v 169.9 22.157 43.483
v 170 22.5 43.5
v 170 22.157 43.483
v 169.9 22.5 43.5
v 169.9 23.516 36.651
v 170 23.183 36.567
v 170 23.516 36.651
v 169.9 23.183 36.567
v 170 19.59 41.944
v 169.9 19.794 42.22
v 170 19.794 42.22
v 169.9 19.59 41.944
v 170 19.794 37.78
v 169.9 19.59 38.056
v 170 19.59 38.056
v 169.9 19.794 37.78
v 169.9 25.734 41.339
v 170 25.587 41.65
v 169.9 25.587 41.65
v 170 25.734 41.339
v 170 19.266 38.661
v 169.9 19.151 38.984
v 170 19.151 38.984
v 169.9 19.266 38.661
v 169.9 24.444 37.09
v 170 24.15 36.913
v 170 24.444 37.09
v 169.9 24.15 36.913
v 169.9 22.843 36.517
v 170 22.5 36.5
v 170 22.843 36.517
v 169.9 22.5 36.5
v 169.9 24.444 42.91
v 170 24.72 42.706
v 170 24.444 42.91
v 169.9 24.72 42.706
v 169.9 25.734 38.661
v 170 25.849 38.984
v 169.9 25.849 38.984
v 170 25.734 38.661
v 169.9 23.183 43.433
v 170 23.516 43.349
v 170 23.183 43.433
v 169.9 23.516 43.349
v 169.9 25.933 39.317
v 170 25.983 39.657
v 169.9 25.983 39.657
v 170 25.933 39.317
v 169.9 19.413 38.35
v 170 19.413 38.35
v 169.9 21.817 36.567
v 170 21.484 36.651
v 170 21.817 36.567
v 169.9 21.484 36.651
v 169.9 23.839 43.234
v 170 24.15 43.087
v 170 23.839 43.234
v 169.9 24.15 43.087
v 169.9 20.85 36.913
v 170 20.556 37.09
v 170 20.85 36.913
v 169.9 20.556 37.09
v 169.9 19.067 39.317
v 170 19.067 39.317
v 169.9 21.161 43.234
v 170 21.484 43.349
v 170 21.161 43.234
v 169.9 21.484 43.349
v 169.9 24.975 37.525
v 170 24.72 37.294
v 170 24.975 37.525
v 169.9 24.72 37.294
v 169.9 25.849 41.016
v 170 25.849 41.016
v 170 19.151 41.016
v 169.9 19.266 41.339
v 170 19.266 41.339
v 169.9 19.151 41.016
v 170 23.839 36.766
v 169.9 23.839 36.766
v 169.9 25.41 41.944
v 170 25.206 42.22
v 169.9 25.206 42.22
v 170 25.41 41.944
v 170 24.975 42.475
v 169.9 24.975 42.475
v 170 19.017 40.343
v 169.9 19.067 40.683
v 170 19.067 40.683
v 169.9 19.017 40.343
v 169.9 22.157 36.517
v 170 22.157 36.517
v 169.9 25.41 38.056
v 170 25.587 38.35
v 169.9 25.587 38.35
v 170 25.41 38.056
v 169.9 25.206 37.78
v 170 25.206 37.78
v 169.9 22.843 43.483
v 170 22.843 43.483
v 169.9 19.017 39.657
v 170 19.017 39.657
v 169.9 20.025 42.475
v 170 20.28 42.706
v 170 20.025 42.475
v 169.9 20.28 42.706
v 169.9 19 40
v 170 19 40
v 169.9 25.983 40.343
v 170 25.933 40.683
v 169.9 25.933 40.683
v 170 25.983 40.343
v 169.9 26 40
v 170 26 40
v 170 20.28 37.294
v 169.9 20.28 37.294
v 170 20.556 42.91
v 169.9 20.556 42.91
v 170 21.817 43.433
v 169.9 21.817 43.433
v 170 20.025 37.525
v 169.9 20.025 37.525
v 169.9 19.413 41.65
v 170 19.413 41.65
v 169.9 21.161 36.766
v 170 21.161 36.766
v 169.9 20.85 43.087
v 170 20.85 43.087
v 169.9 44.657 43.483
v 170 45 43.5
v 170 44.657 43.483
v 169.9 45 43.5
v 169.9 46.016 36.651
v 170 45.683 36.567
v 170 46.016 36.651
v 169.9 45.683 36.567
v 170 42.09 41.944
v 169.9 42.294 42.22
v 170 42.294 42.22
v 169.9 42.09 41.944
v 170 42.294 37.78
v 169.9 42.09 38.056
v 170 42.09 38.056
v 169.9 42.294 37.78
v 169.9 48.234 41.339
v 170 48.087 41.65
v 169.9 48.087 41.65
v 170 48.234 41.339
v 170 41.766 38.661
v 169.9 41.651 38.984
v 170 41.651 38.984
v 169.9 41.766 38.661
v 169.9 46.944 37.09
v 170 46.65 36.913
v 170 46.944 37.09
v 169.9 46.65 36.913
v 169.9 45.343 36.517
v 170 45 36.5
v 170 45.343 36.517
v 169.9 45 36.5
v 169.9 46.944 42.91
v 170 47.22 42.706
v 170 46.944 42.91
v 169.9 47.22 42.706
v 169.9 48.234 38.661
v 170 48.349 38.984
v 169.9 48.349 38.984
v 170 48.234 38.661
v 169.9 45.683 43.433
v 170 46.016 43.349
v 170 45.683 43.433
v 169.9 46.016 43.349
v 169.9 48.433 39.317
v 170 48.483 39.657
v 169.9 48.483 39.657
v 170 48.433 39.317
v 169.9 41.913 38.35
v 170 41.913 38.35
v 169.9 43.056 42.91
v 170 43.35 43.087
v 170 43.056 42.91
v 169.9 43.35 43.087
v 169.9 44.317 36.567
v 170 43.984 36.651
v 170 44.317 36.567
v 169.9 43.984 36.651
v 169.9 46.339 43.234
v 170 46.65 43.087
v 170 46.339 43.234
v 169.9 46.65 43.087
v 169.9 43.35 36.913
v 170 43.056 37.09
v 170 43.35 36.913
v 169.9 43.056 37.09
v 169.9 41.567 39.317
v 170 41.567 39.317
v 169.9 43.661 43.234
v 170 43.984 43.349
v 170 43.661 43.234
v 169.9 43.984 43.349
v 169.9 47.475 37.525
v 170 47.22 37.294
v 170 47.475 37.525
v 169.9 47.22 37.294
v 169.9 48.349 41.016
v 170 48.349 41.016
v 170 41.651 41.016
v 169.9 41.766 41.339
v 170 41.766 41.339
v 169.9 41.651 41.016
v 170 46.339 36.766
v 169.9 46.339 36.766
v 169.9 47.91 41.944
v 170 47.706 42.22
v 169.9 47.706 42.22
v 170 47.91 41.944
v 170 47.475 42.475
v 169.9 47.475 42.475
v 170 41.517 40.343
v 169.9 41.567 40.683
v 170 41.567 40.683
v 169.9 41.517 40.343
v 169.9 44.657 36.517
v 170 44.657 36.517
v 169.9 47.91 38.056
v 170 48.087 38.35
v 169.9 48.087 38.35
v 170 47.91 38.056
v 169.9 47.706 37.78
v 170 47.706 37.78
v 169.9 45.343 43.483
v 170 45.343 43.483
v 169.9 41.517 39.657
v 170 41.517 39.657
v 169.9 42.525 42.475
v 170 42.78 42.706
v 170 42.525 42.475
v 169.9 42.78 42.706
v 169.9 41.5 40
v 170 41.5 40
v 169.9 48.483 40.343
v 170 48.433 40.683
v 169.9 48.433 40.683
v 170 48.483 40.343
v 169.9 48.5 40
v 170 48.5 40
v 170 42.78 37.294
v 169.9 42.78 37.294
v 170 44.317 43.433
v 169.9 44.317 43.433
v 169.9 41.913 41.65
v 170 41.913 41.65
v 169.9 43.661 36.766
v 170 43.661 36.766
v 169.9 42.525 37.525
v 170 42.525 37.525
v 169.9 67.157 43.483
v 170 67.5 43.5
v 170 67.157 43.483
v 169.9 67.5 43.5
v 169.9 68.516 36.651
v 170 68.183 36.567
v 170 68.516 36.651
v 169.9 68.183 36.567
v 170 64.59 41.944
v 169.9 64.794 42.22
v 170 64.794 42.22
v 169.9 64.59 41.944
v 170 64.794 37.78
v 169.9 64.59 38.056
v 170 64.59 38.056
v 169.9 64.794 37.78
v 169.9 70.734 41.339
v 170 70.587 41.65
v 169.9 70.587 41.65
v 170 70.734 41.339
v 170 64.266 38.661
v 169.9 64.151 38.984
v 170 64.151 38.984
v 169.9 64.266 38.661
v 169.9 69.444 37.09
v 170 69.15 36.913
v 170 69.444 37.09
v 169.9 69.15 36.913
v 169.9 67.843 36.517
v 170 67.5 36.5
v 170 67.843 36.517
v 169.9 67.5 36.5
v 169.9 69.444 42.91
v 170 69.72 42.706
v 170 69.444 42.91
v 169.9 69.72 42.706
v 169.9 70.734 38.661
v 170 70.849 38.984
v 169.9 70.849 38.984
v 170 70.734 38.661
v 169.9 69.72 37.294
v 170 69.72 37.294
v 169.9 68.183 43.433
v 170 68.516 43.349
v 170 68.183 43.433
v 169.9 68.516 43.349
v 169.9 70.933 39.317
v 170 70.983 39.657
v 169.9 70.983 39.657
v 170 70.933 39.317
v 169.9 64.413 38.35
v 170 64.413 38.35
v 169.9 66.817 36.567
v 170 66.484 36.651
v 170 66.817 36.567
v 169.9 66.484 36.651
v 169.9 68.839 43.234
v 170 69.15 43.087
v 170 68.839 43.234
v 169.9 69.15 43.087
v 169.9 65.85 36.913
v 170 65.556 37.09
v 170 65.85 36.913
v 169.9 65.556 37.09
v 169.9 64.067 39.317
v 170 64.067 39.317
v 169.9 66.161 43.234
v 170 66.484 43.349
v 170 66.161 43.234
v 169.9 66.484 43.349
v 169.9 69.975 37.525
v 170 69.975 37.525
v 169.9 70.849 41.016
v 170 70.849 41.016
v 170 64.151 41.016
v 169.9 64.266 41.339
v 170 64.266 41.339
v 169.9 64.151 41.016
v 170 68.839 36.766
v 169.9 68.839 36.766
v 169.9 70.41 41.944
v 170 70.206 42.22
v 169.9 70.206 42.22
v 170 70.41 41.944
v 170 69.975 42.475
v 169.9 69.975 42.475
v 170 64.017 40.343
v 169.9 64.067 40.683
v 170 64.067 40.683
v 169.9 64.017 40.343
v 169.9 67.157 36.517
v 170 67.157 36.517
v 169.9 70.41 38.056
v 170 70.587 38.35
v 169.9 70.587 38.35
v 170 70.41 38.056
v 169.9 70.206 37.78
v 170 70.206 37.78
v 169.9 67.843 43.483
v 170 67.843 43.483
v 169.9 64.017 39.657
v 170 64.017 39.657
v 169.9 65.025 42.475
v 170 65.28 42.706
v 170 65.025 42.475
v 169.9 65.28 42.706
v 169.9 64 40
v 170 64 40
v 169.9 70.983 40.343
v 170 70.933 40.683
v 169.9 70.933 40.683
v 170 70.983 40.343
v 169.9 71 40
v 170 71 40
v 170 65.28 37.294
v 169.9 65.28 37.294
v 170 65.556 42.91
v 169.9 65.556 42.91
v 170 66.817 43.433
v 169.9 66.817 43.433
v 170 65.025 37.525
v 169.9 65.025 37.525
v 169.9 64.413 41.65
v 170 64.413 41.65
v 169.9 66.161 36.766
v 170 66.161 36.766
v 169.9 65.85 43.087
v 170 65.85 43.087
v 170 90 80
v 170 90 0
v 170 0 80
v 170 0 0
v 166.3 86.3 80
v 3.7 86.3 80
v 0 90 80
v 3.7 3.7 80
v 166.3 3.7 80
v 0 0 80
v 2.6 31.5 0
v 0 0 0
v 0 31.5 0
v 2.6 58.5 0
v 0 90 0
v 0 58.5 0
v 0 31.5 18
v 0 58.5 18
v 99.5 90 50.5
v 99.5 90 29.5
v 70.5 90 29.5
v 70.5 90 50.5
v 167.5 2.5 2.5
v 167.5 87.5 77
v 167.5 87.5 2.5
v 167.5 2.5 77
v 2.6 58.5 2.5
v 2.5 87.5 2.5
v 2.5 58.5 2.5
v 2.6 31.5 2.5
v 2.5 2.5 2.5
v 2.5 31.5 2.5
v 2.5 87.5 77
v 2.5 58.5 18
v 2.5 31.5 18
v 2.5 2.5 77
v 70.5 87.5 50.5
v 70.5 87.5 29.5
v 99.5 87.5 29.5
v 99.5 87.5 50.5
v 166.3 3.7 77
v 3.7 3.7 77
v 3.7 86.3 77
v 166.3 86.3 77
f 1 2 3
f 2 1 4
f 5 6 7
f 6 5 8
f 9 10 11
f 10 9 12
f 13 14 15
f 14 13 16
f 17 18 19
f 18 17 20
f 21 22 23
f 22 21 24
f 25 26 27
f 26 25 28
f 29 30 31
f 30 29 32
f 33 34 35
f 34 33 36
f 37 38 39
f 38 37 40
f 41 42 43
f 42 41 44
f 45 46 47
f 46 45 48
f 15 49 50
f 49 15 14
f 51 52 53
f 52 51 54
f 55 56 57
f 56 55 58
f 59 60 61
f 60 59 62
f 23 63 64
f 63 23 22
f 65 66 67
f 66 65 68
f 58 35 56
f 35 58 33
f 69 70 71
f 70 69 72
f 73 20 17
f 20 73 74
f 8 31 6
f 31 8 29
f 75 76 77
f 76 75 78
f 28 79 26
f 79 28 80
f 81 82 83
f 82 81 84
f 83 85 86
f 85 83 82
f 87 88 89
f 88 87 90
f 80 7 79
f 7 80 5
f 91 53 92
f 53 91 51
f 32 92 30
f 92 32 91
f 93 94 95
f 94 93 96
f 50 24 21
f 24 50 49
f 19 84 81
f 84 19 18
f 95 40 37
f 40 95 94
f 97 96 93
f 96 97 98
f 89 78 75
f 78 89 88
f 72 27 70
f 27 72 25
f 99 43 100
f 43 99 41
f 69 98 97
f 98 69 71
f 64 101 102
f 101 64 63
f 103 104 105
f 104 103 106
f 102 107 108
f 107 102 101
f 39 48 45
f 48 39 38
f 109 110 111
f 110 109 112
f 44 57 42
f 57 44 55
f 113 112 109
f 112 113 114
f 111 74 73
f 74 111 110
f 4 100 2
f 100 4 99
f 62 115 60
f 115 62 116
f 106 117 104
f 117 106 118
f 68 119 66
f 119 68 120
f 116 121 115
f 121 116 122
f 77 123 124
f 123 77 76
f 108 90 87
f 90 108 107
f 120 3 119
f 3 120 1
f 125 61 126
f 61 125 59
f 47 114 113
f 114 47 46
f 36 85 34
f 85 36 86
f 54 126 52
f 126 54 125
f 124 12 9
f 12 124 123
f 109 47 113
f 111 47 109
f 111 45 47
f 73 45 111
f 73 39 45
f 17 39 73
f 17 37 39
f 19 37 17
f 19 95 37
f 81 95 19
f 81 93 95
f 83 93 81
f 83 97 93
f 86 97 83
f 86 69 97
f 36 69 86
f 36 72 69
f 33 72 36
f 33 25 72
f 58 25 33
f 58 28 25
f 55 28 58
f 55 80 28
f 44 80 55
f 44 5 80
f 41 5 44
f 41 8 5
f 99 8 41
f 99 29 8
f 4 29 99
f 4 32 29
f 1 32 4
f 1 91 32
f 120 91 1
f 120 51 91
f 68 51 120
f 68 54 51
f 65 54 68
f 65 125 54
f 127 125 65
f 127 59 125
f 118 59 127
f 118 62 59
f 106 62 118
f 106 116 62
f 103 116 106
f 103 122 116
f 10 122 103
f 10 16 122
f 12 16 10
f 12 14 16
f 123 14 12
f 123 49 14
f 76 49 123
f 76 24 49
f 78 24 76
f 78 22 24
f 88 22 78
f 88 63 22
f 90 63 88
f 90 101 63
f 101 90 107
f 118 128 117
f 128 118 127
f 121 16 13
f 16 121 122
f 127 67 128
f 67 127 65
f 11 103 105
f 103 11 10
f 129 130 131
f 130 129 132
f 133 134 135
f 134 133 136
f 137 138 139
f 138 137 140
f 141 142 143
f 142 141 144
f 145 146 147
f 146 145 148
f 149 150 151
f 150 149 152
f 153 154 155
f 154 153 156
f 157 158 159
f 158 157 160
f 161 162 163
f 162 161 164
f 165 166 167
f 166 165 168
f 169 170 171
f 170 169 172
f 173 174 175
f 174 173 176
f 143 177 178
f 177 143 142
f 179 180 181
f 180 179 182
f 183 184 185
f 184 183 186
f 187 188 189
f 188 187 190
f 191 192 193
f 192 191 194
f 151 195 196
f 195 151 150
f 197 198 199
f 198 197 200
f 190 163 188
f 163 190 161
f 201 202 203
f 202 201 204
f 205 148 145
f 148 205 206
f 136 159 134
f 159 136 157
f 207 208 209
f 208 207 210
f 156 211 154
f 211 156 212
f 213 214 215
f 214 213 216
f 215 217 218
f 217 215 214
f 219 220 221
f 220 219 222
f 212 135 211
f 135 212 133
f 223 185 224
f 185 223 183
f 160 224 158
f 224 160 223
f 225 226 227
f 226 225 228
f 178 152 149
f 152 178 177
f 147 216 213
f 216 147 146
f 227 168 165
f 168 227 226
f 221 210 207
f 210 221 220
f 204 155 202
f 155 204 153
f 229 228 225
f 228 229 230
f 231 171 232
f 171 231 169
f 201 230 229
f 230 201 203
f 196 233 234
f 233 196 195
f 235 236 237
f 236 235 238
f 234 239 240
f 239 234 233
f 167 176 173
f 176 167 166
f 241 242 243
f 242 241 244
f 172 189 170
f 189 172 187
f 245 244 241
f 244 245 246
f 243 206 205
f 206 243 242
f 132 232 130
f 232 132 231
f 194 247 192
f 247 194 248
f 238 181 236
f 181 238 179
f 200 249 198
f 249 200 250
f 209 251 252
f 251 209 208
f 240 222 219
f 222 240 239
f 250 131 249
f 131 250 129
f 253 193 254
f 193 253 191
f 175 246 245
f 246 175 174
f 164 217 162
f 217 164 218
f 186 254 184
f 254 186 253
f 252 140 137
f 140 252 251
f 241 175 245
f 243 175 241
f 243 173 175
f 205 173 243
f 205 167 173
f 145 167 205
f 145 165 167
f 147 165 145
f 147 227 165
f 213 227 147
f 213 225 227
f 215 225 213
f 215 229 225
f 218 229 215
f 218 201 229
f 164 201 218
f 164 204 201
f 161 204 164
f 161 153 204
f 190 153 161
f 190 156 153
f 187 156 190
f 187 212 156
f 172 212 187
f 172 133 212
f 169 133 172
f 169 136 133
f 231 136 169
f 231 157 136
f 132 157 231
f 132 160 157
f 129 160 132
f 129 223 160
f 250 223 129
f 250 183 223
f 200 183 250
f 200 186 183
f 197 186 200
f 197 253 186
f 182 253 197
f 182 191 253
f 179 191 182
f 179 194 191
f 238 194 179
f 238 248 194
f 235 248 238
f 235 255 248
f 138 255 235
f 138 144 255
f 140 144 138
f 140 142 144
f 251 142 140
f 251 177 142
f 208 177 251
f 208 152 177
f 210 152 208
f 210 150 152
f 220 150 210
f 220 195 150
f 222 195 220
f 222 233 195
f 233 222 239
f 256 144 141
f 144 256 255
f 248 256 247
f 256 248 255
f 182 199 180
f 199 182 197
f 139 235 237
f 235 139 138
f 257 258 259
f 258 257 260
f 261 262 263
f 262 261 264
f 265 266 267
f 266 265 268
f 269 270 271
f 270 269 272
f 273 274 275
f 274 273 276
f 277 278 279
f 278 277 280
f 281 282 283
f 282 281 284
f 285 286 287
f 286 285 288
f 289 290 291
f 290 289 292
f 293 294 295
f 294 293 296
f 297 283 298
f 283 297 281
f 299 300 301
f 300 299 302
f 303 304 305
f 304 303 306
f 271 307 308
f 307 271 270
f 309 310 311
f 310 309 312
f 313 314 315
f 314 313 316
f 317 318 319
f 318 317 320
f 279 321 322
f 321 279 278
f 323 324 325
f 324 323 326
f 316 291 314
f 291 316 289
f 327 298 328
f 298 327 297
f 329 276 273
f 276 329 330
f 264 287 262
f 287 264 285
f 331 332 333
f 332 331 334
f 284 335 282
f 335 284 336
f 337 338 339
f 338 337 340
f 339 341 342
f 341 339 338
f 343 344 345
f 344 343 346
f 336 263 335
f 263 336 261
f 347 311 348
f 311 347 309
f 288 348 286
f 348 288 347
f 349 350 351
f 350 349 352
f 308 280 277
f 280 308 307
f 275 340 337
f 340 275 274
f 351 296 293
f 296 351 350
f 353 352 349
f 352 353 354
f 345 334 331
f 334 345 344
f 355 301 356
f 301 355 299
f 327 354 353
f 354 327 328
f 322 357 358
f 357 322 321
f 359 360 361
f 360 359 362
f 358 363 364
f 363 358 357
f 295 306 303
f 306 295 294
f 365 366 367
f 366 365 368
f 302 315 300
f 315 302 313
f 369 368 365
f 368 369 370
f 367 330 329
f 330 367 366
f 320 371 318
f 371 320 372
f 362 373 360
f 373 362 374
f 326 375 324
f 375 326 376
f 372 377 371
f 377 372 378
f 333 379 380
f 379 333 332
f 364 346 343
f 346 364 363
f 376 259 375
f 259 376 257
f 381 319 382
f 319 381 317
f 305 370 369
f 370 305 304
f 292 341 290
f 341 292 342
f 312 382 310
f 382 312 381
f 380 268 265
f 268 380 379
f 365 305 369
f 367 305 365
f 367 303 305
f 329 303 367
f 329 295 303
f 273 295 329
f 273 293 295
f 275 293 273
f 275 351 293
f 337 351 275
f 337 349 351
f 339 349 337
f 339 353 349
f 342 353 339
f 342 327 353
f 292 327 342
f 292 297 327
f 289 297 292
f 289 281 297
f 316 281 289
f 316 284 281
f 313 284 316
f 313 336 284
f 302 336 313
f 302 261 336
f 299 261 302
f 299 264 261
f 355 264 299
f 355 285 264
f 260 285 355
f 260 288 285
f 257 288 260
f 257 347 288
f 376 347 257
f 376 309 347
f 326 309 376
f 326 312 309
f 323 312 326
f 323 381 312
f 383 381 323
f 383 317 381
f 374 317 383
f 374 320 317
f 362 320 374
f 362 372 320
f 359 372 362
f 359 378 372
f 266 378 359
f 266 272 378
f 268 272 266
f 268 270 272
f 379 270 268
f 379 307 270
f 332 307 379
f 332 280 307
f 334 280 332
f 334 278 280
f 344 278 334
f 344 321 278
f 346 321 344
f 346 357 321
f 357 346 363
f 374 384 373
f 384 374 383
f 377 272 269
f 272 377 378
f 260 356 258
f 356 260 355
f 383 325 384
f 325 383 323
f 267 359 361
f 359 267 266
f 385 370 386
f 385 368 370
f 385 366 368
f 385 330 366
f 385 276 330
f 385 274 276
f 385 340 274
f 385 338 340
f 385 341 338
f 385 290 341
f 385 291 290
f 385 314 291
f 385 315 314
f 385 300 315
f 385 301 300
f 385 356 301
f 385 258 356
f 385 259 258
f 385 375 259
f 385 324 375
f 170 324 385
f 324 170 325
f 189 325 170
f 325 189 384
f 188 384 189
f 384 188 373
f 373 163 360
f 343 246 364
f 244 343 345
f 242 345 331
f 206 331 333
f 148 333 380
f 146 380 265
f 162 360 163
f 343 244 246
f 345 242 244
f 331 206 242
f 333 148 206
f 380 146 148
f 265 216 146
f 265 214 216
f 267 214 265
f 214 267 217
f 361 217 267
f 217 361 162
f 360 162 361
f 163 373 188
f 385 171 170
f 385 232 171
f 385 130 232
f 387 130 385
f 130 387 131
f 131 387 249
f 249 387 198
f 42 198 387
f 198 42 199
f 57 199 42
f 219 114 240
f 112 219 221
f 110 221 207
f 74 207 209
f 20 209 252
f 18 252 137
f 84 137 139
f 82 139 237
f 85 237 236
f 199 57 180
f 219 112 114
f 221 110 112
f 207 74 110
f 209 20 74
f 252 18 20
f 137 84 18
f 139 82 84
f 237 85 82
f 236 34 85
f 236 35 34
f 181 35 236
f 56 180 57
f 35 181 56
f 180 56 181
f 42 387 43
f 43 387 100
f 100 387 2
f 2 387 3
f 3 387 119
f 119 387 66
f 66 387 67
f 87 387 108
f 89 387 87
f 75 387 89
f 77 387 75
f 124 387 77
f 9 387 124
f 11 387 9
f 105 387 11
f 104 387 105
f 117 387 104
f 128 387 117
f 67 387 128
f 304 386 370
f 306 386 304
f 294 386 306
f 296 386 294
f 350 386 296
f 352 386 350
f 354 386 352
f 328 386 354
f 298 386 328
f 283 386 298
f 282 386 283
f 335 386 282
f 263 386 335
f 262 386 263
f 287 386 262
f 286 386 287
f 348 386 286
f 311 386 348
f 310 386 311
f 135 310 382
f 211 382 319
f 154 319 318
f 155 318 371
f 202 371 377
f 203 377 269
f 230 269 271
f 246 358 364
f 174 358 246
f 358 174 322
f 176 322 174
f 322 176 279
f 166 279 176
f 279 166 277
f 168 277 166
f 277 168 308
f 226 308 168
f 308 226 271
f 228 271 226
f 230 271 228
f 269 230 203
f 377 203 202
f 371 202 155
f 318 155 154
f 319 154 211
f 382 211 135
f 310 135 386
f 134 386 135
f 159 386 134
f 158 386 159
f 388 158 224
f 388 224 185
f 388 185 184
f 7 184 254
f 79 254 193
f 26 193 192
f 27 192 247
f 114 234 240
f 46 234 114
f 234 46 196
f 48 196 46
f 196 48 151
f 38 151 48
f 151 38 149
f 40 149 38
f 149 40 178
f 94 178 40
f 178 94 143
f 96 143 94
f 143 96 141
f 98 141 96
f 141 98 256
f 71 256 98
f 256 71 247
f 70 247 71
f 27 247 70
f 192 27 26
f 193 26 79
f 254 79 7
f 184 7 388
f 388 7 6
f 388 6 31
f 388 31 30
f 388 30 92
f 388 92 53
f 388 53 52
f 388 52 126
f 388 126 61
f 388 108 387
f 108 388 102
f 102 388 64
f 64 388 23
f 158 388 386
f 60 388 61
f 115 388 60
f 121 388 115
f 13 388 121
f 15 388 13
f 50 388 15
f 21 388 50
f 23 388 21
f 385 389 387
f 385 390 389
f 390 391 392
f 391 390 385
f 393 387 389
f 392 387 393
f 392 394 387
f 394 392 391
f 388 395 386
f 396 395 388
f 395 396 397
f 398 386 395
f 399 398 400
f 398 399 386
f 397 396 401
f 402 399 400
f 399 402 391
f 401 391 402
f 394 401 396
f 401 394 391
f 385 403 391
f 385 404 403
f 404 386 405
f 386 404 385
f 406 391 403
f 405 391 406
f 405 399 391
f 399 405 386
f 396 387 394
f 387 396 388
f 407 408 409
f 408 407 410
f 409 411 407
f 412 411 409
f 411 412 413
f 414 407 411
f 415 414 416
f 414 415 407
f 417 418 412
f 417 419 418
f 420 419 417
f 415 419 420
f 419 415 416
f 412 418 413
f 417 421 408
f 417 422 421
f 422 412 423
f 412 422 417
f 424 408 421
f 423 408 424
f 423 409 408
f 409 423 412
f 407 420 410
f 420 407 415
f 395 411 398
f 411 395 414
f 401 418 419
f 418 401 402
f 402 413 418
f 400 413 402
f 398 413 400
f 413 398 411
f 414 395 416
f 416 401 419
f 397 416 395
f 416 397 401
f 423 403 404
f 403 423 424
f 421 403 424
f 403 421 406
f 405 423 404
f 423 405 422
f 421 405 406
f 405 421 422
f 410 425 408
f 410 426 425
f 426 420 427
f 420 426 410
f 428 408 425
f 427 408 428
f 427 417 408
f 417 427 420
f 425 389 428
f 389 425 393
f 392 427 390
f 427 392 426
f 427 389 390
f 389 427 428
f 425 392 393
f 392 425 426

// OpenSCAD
// =============================================================
// Caixinha IoT — Transporte de Vacinas
// ESP32 DevKit V1 (cabeça para baixo na base)
// DHT22 (parede maior, branco para fora)
// GPS NEO-6M (interno)
// =============================================================
// EXPORTAR STL:
//   openscad -o caixa.stl caixinha.scad -D 'PART="caixa"'
//   openscad -o tampa.stl caixinha.scad -D 'PART="tampa"'
// =============================================================

PART = "caixa";  // "caixa" ou "tampa"

// ── Dimensões externas (mm) ──────────────────────────────────
L      = 170;  // comprimento (paredes MAIORES — DHT22)
W      = 90;   // largura     (paredes MENORES — USB e vents)
H_BOX  = 80;   // altura da caixa
H_LID  =  6;   // altura da tampa
T      =  2.5; // espessura da parede e fundo

// ── Encaixe tampa ────────────────────────────────────────────
LIP_H  = 3.0;  // profundidade do lip de encaixe
LIP_T  = 1.2;  // espessura do lip (folga de ~0.3mm para impressão)

// ── Buraco USB/alimentação (parede MENOR em Y=0) ─────────────
// ESP32 upside-down na base → USB aponta para a parede menor
// Micro-B plug real: ~11×7mm  →  2× margem: 22×14mm
USB_W  = 27;
USB_H  = 18;
USB_CZ = 0;  // começa na base (tipo porta)

// ── Buraco DHT22 (parede MAIOR em X=L) ──────────────────────
// Ligeiramente maior que o buraco USB (22×14mm)
DHT_W  = 29;   // eixo Y (largura da caixa)
DHT_H  = 21;   // eixo Z (altura da caixa)

// ── Furos de ventilação (parede MENOR em Y=W, oposta ao USB) ─
// 3 furos de 7mm ø, centrados na altura
VENT_D = 7;
VENT_Z = H_BOX / 2;

// =============================================================
if (PART == "caixa") caixa();
if (PART == "tampa") tampa();
// =============================================================

module caixa() {
    difference() {
        // ① Bloco externo sólido
        cube([L, W, H_BOX]);

        // ② Escavação interna (cria paredes + fundo, topo aberto)
        translate([T, T, T])
            cube([L - 2*T, W - 2*T, H_BOX]);

        // ③ Recorte USB — parede MENOR (X=0), centrado em Y, começa na base
        translate([-0.1,  W/2 - USB_W/2,  -0.1])
            cube([T + 0.2,  USB_W,  USB_H + 0.1]);

        // ④ Recorte DHT22 — parede MAIOR (Y=W), centrado em X e Z
        translate([L/2 - DHT_W/2,  W - T - 0.1,  H_BOX/2 - DHT_H/2])
            cube([DHT_W,  T + 0.2,  DHT_H]);

        // ⑤ Furos de ventilação — parede MENOR (X=L), oposta ao USB, 3 furos
        for (i = [0 : 2]) {
            translate([L - 0.1,  W * (0.25 + i * 0.25),  VENT_Z])
                rotate([0, 90, 0])
                    cylinder(d=VENT_D, h=T + 0.2, $fn=64);
        }
    }

    // ⑥ Lip interno para encaixar a tampa
    translate([T, T, H_BOX - LIP_H])
        difference() {
            cube([L - 2*T,  W - 2*T,  LIP_H]);
            translate([LIP_T,  LIP_T,  -0.1])
                cube([L - 2*T - 2*LIP_T,  W - 2*T - 2*LIP_T,  LIP_H + 0.2]);
        }
}

module tampa() {
    difference() {
        // Tampa sólida
        cube([L, W, H_LID]);
        // Recorte para encaixar no lip da caixa
        translate([T - LIP_T,  T - LIP_T,  -0.1])
            cube([L - 2*(T - LIP_T),  W - 2*(T - LIP_T),  LIP_H + 0.1]);
    }
}
